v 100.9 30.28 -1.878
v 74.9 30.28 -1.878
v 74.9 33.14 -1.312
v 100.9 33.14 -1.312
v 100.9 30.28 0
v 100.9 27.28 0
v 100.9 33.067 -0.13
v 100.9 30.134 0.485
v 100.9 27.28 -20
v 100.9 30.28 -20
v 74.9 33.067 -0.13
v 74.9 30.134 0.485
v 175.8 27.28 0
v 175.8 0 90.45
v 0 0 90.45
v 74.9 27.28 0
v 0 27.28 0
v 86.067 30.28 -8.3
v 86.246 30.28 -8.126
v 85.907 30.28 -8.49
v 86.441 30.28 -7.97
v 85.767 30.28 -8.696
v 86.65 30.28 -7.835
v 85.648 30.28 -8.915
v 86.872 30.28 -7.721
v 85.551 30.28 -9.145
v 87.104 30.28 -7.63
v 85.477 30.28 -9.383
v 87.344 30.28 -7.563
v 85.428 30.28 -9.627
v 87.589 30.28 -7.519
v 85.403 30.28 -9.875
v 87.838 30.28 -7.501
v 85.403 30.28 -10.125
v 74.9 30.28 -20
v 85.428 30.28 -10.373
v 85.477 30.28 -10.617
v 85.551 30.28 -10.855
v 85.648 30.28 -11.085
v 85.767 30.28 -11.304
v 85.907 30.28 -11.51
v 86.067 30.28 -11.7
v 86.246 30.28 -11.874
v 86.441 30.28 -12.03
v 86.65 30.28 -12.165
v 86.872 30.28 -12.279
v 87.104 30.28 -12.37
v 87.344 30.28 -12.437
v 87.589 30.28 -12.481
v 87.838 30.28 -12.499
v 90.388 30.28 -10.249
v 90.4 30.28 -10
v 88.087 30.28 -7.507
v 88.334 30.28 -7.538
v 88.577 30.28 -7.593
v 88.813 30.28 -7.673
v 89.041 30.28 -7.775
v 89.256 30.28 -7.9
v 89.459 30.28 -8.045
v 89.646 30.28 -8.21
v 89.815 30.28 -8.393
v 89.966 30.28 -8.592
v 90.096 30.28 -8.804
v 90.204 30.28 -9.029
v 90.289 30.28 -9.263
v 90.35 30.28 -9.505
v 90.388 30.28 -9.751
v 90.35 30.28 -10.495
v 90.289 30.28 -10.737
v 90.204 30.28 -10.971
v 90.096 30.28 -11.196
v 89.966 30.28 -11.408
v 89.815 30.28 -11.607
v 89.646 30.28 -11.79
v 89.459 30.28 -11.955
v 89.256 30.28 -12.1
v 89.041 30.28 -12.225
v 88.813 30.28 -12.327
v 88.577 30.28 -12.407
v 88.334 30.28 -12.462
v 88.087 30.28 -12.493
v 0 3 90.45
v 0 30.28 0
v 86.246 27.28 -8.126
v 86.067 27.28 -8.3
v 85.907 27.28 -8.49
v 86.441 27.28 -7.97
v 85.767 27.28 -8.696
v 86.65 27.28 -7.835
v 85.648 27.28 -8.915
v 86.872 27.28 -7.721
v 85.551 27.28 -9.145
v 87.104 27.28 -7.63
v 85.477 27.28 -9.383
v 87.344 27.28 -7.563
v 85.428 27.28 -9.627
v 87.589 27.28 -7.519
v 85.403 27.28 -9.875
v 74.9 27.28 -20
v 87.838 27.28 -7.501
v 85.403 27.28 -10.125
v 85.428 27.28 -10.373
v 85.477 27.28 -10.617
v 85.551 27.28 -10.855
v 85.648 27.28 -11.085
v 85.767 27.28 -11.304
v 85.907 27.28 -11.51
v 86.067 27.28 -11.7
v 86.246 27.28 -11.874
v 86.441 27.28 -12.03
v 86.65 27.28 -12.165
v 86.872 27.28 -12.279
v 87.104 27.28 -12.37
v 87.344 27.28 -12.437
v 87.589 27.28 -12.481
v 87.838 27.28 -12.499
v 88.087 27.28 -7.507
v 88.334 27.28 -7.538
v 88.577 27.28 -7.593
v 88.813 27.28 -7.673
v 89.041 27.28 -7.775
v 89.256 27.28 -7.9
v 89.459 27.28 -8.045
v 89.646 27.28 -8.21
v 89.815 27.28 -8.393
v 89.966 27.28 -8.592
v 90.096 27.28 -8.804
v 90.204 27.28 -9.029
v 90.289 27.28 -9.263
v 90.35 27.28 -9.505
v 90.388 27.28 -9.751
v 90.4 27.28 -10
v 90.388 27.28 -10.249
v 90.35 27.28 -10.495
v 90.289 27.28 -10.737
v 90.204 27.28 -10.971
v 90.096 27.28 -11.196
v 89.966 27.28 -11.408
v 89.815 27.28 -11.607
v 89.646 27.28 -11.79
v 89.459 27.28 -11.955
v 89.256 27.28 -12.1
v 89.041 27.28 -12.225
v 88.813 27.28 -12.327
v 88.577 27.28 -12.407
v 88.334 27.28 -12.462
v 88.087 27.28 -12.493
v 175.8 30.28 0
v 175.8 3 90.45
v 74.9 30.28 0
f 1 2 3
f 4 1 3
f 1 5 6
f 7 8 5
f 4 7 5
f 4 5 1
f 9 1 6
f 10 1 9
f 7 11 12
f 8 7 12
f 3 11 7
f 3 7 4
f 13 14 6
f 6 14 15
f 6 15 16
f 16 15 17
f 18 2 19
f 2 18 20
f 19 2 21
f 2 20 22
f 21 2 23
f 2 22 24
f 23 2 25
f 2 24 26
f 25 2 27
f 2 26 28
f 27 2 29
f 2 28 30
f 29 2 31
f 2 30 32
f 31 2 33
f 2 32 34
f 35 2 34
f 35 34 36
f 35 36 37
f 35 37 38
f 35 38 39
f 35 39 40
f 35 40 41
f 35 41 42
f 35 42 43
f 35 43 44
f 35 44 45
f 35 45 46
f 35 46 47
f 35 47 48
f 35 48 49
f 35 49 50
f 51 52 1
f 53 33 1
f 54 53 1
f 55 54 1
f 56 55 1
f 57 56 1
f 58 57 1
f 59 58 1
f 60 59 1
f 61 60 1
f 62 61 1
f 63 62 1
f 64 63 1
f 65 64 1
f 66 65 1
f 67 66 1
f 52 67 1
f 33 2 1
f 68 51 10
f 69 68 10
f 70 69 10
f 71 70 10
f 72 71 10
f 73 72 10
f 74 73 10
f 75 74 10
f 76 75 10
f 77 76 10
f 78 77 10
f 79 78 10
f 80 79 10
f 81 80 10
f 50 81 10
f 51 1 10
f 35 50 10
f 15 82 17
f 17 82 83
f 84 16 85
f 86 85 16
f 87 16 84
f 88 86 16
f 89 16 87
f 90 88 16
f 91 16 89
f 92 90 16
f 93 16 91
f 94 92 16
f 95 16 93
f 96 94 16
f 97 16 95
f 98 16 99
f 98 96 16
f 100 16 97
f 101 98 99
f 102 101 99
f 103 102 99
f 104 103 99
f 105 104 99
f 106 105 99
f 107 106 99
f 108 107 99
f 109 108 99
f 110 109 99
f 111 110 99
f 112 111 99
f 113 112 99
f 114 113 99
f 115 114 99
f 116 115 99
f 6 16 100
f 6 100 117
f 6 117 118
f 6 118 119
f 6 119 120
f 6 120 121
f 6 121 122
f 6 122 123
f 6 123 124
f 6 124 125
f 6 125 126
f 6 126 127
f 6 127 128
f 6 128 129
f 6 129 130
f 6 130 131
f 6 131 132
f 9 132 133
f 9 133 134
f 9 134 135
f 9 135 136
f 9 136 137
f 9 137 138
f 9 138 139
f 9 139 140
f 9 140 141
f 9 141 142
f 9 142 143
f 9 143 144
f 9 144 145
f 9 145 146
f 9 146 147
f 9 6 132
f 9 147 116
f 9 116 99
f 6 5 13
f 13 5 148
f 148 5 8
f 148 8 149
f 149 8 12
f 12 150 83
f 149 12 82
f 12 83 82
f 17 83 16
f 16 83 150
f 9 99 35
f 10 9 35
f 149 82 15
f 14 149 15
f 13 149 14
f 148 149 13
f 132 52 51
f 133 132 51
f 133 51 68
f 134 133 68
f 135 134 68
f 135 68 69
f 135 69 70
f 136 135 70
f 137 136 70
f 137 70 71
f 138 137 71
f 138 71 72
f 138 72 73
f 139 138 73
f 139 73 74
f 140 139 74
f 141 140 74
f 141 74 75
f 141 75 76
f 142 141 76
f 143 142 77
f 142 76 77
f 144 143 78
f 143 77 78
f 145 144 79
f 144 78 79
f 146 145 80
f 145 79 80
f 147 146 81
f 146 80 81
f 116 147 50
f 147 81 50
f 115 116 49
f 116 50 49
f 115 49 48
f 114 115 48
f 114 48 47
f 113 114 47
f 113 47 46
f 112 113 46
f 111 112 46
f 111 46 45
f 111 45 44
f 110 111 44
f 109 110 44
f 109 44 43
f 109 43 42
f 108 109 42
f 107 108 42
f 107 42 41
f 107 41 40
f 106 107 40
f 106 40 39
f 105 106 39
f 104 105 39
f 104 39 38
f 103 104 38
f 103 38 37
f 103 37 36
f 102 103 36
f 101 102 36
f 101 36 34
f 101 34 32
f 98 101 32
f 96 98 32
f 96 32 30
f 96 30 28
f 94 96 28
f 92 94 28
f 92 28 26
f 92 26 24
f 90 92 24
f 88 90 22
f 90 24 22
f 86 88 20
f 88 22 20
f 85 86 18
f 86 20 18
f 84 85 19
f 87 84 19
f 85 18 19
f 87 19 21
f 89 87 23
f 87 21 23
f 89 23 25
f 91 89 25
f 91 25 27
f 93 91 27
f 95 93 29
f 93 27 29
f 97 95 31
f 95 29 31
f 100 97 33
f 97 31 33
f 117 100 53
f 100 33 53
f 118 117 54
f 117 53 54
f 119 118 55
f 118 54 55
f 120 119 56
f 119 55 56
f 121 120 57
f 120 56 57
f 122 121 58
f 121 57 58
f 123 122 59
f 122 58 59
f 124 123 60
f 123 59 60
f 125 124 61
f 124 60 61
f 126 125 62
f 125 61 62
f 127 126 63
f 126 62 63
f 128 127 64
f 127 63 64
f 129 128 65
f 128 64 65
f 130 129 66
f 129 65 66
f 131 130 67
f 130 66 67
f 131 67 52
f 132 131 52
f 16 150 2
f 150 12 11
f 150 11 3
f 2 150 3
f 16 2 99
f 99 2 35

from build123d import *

# Parameters (mm, degrees)
SALIENTE_EXTRUIR1_DEPTH = 175.8
CROQUIS3_W              = 20
CROQUIS3_H              = 3
SALIENTE_EXTRUIR2_DEPTH = 175.8
CROQUIS4_W              = 74.9
CROQUIS4_H              = 20
CROQUIS4_R              = 2.5
CORTAR_EXTRUIR1_DEPTH   = 165.8
SALIENTE_EXTRUIR3_START = -26
SALIENTE_EXTRUIR3_DEPTH = 26
CORTAR_EXTRUIR2_DEPTH   = 26


with BuildPart() as part:
    # Croquis2 → Saliente-Extruir1 (new body)
    with BuildSketch(Plane(origin=(0, 0, 0), x_dir=(0, 0, -1), z_dir=(1, 0, 0))):
        Polygon((0, 27.28), (0, 30.28), (-90.45, 3), (-90.45, 0), align=None)
    extrude(amount=SALIENTE_EXTRUIR1_DEPTH)

    # Croquis3 → Saliente-Extruir2 (add)
    with BuildSketch(Plane(origin=(175.8, 0, 0), x_dir=(0, 0, -1), z_dir=(1, 0, 0))):
        with Locations((10, 28.78)):
            Rectangle(CROQUIS3_W, CROQUIS3_H)
    extrude(amount=-SALIENTE_EXTRUIR2_DEPTH)

    # Croquis4 → Cortar-Extruir1 (cut)
    with BuildSketch(Plane(origin=(0, 30.28, 0), x_dir=(1, 0, 0), z_dir=(0, 1, 0))):
        with Locations((138.35, 10)):
            Rectangle(CROQUIS4_W, CROQUIS4_H)
        with Locations((37.45, 10)):
            Rectangle(CROQUIS4_W, CROQUIS4_H)
        with Locations((87.9, 10)):
            Circle(CROQUIS4_R)
    extrude(amount=-CORTAR_EXTRUIR1_DEPTH, mode=Mode.SUBTRACT)

    # Croquis5 → Saliente-Extruir3 (add)
    with BuildSketch(Plane(origin=(100.9, 0, 0), x_dir=(0, 0, -1), z_dir=(1, 0, 0)).offset(SALIENTE_EXTRUIR3_START)):
        Polygon((1.878378592, 30.28), (0.745913837, 36.00039966), (-0.555574899, 29.798151404), align=None)
    extrude(amount=SALIENTE_EXTRUIR3_DEPTH)

    # Croquis6 → Cortar-Extruir2 (cut)
    with BuildSketch(Plane(origin=(100.9, 0, 0), x_dir=(0, 0, -1), z_dir=(1, 0, 0))):
        Polygon((0.130372487, 33.067035615), (1.312146214, 33.14019983), (0.745913837, 36.00039966), align=None)
    extrude(amount=-CORTAR_EXTRUIR2_DEPTH, mode=Mode.SUBTRACT)


solid = part.part
